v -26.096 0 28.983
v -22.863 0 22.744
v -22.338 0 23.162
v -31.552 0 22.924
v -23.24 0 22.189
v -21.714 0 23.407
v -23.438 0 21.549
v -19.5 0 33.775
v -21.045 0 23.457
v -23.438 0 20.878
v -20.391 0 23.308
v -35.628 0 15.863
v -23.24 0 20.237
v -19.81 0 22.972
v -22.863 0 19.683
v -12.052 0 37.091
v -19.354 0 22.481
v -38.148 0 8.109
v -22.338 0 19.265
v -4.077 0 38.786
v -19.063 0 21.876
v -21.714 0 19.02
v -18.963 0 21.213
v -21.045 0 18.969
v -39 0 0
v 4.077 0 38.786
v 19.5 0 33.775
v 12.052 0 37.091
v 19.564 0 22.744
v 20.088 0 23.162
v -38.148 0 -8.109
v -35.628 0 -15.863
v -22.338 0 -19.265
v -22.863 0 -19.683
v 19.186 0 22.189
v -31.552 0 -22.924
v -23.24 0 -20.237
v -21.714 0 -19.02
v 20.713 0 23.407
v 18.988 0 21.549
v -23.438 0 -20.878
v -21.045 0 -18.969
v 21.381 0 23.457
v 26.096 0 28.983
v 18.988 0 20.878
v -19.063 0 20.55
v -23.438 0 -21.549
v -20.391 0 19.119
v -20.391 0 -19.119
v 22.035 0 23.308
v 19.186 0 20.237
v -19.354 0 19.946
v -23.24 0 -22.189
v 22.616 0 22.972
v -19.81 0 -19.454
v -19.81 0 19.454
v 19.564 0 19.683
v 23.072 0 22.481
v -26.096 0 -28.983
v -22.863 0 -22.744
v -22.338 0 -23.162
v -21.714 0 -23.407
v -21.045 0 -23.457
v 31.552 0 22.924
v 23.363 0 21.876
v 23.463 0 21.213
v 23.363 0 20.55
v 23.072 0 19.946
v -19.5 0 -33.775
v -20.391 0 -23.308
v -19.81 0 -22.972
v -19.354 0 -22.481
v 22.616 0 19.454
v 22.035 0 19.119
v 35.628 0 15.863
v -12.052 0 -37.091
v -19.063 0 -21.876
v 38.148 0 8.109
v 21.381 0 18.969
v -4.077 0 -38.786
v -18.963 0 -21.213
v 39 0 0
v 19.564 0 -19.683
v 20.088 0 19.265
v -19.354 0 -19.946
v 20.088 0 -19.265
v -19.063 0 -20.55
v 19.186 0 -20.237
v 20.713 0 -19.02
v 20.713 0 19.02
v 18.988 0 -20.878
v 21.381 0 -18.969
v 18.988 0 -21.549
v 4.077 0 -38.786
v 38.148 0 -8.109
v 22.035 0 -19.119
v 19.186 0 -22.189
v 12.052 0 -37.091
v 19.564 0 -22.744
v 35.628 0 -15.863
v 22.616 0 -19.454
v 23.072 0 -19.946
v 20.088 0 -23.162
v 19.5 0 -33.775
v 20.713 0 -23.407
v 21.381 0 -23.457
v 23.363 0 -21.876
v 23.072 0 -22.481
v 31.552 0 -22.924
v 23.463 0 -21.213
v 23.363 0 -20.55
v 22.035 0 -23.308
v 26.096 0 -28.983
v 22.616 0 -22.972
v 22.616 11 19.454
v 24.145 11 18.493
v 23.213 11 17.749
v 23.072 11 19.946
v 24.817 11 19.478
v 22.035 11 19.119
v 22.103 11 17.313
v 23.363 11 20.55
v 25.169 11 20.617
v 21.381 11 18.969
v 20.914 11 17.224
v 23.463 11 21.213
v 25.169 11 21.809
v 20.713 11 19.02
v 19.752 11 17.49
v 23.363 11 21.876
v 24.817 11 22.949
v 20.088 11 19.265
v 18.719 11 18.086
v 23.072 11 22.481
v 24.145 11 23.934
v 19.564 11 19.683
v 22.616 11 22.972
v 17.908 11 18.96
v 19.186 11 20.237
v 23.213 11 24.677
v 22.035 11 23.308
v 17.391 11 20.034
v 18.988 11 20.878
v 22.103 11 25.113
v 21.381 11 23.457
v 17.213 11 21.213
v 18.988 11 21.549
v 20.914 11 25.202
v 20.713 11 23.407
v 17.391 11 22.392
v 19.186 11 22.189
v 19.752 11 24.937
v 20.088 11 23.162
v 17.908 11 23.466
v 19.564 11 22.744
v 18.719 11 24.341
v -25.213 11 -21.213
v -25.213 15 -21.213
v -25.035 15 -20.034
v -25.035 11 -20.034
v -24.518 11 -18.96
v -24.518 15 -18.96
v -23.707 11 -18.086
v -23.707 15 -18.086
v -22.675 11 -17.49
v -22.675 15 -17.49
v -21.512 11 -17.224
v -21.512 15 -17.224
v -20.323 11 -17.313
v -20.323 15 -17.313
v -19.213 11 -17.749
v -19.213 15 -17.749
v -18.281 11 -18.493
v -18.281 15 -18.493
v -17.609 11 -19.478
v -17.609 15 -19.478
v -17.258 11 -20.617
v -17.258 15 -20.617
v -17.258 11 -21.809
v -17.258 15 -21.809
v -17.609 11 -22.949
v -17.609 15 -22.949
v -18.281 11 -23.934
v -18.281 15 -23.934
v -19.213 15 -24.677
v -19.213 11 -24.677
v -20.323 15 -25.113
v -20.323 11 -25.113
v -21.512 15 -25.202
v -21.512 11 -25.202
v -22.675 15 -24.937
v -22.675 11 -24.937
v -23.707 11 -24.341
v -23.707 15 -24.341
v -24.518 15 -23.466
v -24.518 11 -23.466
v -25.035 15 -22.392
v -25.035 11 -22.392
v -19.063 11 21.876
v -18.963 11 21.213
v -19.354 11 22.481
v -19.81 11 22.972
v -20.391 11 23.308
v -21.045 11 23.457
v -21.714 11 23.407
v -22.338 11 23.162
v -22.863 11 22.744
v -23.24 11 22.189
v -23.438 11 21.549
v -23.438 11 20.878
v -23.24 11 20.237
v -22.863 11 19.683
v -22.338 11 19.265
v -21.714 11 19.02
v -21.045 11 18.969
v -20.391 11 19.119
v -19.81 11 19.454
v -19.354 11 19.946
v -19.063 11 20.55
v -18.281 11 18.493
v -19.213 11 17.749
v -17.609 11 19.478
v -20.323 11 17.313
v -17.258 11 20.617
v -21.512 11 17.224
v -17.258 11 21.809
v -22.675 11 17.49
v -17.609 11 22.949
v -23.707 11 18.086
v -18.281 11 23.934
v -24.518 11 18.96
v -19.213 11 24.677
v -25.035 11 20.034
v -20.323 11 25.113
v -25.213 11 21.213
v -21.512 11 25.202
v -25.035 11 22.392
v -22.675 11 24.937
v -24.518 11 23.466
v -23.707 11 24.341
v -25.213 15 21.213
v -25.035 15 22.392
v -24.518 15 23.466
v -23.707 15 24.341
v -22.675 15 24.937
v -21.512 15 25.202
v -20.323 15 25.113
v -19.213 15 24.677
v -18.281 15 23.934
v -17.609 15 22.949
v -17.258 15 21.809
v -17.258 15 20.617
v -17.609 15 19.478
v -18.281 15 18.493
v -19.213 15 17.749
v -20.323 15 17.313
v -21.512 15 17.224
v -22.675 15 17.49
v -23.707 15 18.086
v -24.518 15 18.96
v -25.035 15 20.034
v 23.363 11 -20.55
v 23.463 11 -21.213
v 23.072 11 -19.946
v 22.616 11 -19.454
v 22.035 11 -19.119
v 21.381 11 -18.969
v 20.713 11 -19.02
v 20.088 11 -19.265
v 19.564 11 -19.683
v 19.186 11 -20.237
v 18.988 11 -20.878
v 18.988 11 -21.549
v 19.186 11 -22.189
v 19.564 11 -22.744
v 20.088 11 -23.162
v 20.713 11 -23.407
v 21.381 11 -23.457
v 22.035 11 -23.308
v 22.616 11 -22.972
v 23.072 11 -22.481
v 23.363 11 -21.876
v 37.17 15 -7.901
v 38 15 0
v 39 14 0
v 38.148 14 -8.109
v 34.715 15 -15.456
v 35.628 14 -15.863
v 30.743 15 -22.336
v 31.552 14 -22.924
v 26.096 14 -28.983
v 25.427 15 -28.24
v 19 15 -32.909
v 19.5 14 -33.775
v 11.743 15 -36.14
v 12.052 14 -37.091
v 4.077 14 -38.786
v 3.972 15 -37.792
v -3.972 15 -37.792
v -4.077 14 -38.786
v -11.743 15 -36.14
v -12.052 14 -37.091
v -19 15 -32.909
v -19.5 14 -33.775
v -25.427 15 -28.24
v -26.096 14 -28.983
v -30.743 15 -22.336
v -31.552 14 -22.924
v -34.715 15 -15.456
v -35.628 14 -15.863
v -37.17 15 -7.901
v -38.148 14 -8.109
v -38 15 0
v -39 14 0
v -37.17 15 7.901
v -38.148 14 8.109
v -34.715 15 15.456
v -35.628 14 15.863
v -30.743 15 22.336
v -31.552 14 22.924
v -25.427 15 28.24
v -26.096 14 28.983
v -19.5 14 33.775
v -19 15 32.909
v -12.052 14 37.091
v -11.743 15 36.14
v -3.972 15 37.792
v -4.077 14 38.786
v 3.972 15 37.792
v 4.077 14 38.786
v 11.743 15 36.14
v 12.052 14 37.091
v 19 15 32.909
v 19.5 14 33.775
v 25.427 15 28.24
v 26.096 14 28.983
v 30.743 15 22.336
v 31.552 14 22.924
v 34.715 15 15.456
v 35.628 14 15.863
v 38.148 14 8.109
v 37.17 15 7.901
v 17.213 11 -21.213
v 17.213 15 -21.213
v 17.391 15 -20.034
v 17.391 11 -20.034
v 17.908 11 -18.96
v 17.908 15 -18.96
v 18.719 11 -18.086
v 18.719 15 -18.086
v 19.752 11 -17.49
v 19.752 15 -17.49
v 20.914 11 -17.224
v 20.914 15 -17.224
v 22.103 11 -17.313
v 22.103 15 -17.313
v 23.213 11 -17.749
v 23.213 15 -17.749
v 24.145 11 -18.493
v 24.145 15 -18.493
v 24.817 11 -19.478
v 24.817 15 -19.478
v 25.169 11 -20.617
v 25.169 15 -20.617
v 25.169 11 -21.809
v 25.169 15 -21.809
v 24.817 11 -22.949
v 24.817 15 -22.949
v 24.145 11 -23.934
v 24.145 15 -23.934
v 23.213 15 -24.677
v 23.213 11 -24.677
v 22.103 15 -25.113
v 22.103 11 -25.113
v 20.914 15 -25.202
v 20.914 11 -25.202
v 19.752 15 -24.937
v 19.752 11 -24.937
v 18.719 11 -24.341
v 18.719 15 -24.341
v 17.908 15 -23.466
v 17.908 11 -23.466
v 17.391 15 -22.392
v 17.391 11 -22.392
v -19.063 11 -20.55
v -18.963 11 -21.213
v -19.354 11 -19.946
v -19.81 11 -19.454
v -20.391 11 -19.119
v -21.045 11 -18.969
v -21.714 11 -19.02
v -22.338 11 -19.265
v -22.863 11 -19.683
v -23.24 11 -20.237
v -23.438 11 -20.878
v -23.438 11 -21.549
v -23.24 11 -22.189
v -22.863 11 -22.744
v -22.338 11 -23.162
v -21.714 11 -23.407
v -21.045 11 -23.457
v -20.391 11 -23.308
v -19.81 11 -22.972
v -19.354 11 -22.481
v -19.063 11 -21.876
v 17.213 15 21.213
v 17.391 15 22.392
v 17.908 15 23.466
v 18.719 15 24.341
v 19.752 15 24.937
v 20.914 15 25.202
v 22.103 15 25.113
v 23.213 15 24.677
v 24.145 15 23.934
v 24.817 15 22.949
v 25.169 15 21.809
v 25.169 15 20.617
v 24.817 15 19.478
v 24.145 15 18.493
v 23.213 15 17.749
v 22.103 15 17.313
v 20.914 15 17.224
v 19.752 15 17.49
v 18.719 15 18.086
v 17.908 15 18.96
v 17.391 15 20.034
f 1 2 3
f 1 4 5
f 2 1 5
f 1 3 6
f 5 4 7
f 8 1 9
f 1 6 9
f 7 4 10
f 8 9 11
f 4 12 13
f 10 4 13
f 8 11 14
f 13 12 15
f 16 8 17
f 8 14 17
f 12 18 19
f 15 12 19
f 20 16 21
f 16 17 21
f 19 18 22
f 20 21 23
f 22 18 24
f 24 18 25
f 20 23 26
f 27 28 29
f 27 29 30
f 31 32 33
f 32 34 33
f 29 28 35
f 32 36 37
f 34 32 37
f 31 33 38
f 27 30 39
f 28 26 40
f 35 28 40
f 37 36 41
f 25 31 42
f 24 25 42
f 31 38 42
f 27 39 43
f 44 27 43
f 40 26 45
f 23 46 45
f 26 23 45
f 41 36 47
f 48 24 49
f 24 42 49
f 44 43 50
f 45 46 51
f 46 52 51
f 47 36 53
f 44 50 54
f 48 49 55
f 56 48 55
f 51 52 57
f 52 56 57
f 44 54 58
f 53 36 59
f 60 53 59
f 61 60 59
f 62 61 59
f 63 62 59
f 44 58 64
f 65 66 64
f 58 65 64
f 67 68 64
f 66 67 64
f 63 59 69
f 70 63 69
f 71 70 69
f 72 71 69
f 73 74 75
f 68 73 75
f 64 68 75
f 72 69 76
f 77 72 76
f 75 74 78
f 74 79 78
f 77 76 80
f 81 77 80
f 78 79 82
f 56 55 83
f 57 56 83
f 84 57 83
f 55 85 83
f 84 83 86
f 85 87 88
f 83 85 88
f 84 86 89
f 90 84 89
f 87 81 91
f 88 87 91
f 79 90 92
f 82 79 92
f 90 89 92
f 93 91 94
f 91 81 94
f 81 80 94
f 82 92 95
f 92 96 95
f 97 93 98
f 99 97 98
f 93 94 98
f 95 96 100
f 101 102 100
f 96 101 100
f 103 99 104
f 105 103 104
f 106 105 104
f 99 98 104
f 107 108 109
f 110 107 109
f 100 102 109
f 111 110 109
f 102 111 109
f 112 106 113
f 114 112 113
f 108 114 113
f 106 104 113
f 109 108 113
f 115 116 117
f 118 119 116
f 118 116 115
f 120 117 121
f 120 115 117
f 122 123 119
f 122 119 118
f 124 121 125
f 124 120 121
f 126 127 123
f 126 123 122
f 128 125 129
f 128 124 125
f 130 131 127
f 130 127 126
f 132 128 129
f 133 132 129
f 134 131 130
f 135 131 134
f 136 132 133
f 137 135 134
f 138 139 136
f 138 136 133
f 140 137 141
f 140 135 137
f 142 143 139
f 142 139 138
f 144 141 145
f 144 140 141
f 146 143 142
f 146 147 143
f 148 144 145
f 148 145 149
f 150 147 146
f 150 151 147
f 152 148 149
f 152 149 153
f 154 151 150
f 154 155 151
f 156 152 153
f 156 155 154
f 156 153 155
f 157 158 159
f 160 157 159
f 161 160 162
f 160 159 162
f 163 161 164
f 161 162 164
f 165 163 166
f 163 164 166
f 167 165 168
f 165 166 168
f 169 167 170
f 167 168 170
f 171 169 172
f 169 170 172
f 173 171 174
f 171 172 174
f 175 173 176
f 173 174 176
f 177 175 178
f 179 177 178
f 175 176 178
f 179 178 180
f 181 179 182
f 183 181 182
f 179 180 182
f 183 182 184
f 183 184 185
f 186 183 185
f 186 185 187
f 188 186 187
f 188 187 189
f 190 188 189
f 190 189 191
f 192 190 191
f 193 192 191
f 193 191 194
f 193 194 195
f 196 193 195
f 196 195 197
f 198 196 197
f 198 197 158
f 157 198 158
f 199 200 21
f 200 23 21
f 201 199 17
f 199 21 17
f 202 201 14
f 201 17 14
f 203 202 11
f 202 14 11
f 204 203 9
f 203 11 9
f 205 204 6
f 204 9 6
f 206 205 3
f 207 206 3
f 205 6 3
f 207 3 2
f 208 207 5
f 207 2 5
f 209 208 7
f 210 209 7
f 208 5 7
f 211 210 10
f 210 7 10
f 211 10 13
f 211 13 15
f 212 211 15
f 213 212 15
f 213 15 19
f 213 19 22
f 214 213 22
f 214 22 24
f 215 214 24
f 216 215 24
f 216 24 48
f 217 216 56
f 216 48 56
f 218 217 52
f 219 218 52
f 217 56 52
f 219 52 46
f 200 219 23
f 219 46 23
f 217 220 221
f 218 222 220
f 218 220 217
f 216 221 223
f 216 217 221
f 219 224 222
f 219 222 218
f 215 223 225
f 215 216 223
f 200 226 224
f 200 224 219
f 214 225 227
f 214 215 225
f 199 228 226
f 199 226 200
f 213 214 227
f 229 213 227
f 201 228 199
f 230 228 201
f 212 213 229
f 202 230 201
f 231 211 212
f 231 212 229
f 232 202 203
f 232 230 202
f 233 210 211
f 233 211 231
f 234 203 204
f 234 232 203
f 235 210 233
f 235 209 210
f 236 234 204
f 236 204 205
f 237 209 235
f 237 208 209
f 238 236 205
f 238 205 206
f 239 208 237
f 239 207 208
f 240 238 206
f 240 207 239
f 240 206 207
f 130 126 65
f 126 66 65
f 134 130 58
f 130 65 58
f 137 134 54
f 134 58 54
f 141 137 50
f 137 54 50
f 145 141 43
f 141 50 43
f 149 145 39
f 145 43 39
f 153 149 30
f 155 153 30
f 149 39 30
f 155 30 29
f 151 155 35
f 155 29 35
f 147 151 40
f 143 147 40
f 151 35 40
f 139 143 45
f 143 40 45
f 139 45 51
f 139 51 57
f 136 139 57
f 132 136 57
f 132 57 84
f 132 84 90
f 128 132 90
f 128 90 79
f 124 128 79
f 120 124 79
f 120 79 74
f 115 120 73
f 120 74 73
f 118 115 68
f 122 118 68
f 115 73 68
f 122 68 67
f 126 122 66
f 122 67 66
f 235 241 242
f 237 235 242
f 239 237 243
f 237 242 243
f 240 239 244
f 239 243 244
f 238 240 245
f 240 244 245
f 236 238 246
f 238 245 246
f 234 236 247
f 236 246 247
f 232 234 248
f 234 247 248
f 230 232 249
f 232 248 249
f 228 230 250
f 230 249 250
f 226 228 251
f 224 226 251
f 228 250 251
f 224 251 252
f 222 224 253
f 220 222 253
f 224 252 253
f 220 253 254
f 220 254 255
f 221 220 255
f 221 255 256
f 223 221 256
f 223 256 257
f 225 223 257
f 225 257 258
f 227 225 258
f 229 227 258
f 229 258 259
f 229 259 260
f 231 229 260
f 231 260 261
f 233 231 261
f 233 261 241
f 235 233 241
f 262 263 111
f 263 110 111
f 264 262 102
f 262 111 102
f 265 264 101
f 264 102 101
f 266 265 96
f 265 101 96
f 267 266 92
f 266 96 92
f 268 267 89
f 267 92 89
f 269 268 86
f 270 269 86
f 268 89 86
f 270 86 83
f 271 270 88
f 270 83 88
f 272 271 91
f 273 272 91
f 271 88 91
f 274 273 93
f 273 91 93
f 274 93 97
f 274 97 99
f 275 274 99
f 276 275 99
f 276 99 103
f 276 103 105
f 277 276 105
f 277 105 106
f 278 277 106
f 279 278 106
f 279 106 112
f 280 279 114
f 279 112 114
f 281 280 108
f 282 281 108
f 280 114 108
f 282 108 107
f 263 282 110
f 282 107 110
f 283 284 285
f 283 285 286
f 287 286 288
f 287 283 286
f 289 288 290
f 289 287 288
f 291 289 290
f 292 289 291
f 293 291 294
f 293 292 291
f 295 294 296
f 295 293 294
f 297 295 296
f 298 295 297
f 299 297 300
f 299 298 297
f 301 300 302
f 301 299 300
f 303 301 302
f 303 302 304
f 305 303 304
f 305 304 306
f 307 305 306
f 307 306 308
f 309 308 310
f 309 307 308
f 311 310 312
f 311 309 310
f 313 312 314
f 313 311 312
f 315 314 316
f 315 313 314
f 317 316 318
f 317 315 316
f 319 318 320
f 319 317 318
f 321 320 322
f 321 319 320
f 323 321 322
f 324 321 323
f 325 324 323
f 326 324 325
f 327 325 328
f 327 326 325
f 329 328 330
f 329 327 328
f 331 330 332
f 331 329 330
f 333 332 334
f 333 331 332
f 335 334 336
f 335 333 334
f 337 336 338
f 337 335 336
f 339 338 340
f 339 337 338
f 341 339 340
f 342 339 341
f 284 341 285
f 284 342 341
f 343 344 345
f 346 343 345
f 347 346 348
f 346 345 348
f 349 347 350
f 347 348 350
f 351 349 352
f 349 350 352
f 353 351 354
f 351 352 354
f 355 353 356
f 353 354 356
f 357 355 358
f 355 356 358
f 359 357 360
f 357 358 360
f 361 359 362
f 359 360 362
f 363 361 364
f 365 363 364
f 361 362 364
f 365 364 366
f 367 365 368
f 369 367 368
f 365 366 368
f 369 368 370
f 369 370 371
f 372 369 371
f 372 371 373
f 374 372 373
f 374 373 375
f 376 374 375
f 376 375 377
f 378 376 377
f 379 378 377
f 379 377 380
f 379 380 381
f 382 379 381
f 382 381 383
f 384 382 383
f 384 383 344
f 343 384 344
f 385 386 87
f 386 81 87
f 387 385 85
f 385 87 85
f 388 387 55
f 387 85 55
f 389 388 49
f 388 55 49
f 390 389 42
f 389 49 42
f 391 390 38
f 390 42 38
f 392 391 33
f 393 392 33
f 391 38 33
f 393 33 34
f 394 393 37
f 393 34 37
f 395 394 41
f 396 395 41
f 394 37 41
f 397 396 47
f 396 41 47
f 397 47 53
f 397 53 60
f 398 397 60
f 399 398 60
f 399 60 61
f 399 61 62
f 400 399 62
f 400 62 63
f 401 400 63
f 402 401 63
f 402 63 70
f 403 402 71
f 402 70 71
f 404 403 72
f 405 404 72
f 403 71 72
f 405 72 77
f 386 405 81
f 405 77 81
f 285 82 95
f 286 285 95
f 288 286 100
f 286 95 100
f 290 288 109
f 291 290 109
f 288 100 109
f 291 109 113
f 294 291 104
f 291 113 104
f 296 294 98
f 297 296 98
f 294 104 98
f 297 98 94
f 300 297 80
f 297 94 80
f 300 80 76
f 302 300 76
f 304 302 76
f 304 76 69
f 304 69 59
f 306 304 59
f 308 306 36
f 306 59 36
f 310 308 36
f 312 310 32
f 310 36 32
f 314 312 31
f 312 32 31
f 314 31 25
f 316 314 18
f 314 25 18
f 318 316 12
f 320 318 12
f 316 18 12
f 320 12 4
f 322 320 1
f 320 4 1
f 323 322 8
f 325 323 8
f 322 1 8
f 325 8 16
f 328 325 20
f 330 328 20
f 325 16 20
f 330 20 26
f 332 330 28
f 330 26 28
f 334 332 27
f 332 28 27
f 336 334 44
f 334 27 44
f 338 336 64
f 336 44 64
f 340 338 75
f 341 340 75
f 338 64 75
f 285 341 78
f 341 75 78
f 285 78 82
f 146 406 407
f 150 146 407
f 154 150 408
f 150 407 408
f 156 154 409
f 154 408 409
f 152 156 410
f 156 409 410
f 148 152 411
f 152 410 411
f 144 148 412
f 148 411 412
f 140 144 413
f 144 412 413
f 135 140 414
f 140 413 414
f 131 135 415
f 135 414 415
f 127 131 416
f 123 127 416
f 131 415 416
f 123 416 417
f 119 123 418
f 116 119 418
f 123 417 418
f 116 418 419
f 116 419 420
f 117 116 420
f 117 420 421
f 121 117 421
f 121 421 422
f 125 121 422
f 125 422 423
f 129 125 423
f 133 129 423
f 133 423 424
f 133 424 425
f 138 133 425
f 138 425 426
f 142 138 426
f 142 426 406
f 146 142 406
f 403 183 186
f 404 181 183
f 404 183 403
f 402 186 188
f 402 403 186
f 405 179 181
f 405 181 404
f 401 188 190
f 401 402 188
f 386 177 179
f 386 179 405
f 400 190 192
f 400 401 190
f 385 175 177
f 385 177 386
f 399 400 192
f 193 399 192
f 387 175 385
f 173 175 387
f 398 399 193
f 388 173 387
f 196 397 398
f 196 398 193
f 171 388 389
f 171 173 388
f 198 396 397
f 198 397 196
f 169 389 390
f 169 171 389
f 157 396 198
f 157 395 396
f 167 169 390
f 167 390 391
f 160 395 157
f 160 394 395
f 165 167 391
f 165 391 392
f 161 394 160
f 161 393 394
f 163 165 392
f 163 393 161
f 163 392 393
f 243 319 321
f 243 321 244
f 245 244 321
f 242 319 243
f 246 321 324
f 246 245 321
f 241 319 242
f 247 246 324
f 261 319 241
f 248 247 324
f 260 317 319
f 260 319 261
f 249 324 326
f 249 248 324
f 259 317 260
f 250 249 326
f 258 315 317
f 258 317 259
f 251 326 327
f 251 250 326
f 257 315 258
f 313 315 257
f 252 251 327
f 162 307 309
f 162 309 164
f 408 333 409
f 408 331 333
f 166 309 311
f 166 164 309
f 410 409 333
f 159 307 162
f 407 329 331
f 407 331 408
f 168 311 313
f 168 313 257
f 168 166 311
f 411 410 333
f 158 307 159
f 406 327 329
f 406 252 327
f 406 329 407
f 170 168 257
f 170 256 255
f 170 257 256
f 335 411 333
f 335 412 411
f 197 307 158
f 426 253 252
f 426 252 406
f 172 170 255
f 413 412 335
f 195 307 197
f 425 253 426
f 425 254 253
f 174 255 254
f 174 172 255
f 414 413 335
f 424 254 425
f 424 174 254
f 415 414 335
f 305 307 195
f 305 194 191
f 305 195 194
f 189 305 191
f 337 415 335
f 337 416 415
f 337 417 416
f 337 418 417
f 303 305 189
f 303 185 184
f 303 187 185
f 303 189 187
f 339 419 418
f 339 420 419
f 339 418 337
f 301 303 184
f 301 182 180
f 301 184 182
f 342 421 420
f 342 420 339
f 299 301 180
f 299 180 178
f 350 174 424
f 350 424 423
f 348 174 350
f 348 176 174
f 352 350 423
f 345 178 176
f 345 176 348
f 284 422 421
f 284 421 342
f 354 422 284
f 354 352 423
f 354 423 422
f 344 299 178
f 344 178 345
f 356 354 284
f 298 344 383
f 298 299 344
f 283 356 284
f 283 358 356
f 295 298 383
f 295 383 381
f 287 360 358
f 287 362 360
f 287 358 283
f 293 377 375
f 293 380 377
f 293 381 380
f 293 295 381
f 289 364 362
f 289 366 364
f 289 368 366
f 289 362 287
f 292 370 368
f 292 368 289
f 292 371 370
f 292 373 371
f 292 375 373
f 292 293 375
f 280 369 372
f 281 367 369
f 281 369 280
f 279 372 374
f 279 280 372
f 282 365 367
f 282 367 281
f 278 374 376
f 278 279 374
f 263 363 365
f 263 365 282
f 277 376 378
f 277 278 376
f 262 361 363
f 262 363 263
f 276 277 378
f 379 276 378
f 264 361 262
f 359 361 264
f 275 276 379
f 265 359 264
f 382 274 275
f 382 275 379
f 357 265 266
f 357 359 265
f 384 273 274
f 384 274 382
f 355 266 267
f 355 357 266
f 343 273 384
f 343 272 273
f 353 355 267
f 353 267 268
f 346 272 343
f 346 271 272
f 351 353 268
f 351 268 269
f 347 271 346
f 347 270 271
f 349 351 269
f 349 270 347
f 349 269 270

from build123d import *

# Parameters (mm, degrees)
SKETCH1_R                                       = 39
BOSS_EXTRUDE1_DEPTH                             = 15
CBORE_FOR_M4_SOCKET_HEAD_CAP_SCREW1_D           = 4.5
CBORE_FOR_M4_SOCKET_HEAD_CAP_SCREW1_CBORE_D     = 8
CBORE_FOR_M4_SOCKET_HEAD_CAP_SCREW1_CBORE_DEPTH = 4
CHAMFER1_SIZE                                   = 1


with BuildPart() as part:
    # Sketch1 → Boss-Extrude1 (new body)
    with BuildSketch(Plane(origin=(0, 0, 0), x_dir=(1, 0, 0), z_dir=(0, 1, 0))):
        Circle(SKETCH1_R)
    extrude(amount=BOSS_EXTRUDE1_DEPTH)

    # CBORE for M4 Socket Head Cap Screw1 (through all)
    with Locations(Plane(origin=(0, 15, 0), x_dir=(-1, 0, 0), z_dir=(0, 1, 0))):
        with Locations((21.213203436, -21.213203436), (21.213203436, 21.213203436), (-21.213203436, 21.213203436), (-21.213203436, -21.213203436)):
            CounterBoreHole(CBORE_FOR_M4_SOCKET_HEAD_CAP_SCREW1_D / 2, CBORE_FOR_M4_SOCKET_HEAD_CAP_SCREW1_CBORE_D / 2, CBORE_FOR_M4_SOCKET_HEAD_CAP_SCREW1_CBORE_DEPTH)

    # Chamfer1
    chamfer1_edges = [part.edges().sort_by_distance(p)[0] for p in [
        (-39, 15, 0),
    ]]
    chamfer(chamfer1_edges, length=CHAMFER1_SIZE)


solid = part.part
